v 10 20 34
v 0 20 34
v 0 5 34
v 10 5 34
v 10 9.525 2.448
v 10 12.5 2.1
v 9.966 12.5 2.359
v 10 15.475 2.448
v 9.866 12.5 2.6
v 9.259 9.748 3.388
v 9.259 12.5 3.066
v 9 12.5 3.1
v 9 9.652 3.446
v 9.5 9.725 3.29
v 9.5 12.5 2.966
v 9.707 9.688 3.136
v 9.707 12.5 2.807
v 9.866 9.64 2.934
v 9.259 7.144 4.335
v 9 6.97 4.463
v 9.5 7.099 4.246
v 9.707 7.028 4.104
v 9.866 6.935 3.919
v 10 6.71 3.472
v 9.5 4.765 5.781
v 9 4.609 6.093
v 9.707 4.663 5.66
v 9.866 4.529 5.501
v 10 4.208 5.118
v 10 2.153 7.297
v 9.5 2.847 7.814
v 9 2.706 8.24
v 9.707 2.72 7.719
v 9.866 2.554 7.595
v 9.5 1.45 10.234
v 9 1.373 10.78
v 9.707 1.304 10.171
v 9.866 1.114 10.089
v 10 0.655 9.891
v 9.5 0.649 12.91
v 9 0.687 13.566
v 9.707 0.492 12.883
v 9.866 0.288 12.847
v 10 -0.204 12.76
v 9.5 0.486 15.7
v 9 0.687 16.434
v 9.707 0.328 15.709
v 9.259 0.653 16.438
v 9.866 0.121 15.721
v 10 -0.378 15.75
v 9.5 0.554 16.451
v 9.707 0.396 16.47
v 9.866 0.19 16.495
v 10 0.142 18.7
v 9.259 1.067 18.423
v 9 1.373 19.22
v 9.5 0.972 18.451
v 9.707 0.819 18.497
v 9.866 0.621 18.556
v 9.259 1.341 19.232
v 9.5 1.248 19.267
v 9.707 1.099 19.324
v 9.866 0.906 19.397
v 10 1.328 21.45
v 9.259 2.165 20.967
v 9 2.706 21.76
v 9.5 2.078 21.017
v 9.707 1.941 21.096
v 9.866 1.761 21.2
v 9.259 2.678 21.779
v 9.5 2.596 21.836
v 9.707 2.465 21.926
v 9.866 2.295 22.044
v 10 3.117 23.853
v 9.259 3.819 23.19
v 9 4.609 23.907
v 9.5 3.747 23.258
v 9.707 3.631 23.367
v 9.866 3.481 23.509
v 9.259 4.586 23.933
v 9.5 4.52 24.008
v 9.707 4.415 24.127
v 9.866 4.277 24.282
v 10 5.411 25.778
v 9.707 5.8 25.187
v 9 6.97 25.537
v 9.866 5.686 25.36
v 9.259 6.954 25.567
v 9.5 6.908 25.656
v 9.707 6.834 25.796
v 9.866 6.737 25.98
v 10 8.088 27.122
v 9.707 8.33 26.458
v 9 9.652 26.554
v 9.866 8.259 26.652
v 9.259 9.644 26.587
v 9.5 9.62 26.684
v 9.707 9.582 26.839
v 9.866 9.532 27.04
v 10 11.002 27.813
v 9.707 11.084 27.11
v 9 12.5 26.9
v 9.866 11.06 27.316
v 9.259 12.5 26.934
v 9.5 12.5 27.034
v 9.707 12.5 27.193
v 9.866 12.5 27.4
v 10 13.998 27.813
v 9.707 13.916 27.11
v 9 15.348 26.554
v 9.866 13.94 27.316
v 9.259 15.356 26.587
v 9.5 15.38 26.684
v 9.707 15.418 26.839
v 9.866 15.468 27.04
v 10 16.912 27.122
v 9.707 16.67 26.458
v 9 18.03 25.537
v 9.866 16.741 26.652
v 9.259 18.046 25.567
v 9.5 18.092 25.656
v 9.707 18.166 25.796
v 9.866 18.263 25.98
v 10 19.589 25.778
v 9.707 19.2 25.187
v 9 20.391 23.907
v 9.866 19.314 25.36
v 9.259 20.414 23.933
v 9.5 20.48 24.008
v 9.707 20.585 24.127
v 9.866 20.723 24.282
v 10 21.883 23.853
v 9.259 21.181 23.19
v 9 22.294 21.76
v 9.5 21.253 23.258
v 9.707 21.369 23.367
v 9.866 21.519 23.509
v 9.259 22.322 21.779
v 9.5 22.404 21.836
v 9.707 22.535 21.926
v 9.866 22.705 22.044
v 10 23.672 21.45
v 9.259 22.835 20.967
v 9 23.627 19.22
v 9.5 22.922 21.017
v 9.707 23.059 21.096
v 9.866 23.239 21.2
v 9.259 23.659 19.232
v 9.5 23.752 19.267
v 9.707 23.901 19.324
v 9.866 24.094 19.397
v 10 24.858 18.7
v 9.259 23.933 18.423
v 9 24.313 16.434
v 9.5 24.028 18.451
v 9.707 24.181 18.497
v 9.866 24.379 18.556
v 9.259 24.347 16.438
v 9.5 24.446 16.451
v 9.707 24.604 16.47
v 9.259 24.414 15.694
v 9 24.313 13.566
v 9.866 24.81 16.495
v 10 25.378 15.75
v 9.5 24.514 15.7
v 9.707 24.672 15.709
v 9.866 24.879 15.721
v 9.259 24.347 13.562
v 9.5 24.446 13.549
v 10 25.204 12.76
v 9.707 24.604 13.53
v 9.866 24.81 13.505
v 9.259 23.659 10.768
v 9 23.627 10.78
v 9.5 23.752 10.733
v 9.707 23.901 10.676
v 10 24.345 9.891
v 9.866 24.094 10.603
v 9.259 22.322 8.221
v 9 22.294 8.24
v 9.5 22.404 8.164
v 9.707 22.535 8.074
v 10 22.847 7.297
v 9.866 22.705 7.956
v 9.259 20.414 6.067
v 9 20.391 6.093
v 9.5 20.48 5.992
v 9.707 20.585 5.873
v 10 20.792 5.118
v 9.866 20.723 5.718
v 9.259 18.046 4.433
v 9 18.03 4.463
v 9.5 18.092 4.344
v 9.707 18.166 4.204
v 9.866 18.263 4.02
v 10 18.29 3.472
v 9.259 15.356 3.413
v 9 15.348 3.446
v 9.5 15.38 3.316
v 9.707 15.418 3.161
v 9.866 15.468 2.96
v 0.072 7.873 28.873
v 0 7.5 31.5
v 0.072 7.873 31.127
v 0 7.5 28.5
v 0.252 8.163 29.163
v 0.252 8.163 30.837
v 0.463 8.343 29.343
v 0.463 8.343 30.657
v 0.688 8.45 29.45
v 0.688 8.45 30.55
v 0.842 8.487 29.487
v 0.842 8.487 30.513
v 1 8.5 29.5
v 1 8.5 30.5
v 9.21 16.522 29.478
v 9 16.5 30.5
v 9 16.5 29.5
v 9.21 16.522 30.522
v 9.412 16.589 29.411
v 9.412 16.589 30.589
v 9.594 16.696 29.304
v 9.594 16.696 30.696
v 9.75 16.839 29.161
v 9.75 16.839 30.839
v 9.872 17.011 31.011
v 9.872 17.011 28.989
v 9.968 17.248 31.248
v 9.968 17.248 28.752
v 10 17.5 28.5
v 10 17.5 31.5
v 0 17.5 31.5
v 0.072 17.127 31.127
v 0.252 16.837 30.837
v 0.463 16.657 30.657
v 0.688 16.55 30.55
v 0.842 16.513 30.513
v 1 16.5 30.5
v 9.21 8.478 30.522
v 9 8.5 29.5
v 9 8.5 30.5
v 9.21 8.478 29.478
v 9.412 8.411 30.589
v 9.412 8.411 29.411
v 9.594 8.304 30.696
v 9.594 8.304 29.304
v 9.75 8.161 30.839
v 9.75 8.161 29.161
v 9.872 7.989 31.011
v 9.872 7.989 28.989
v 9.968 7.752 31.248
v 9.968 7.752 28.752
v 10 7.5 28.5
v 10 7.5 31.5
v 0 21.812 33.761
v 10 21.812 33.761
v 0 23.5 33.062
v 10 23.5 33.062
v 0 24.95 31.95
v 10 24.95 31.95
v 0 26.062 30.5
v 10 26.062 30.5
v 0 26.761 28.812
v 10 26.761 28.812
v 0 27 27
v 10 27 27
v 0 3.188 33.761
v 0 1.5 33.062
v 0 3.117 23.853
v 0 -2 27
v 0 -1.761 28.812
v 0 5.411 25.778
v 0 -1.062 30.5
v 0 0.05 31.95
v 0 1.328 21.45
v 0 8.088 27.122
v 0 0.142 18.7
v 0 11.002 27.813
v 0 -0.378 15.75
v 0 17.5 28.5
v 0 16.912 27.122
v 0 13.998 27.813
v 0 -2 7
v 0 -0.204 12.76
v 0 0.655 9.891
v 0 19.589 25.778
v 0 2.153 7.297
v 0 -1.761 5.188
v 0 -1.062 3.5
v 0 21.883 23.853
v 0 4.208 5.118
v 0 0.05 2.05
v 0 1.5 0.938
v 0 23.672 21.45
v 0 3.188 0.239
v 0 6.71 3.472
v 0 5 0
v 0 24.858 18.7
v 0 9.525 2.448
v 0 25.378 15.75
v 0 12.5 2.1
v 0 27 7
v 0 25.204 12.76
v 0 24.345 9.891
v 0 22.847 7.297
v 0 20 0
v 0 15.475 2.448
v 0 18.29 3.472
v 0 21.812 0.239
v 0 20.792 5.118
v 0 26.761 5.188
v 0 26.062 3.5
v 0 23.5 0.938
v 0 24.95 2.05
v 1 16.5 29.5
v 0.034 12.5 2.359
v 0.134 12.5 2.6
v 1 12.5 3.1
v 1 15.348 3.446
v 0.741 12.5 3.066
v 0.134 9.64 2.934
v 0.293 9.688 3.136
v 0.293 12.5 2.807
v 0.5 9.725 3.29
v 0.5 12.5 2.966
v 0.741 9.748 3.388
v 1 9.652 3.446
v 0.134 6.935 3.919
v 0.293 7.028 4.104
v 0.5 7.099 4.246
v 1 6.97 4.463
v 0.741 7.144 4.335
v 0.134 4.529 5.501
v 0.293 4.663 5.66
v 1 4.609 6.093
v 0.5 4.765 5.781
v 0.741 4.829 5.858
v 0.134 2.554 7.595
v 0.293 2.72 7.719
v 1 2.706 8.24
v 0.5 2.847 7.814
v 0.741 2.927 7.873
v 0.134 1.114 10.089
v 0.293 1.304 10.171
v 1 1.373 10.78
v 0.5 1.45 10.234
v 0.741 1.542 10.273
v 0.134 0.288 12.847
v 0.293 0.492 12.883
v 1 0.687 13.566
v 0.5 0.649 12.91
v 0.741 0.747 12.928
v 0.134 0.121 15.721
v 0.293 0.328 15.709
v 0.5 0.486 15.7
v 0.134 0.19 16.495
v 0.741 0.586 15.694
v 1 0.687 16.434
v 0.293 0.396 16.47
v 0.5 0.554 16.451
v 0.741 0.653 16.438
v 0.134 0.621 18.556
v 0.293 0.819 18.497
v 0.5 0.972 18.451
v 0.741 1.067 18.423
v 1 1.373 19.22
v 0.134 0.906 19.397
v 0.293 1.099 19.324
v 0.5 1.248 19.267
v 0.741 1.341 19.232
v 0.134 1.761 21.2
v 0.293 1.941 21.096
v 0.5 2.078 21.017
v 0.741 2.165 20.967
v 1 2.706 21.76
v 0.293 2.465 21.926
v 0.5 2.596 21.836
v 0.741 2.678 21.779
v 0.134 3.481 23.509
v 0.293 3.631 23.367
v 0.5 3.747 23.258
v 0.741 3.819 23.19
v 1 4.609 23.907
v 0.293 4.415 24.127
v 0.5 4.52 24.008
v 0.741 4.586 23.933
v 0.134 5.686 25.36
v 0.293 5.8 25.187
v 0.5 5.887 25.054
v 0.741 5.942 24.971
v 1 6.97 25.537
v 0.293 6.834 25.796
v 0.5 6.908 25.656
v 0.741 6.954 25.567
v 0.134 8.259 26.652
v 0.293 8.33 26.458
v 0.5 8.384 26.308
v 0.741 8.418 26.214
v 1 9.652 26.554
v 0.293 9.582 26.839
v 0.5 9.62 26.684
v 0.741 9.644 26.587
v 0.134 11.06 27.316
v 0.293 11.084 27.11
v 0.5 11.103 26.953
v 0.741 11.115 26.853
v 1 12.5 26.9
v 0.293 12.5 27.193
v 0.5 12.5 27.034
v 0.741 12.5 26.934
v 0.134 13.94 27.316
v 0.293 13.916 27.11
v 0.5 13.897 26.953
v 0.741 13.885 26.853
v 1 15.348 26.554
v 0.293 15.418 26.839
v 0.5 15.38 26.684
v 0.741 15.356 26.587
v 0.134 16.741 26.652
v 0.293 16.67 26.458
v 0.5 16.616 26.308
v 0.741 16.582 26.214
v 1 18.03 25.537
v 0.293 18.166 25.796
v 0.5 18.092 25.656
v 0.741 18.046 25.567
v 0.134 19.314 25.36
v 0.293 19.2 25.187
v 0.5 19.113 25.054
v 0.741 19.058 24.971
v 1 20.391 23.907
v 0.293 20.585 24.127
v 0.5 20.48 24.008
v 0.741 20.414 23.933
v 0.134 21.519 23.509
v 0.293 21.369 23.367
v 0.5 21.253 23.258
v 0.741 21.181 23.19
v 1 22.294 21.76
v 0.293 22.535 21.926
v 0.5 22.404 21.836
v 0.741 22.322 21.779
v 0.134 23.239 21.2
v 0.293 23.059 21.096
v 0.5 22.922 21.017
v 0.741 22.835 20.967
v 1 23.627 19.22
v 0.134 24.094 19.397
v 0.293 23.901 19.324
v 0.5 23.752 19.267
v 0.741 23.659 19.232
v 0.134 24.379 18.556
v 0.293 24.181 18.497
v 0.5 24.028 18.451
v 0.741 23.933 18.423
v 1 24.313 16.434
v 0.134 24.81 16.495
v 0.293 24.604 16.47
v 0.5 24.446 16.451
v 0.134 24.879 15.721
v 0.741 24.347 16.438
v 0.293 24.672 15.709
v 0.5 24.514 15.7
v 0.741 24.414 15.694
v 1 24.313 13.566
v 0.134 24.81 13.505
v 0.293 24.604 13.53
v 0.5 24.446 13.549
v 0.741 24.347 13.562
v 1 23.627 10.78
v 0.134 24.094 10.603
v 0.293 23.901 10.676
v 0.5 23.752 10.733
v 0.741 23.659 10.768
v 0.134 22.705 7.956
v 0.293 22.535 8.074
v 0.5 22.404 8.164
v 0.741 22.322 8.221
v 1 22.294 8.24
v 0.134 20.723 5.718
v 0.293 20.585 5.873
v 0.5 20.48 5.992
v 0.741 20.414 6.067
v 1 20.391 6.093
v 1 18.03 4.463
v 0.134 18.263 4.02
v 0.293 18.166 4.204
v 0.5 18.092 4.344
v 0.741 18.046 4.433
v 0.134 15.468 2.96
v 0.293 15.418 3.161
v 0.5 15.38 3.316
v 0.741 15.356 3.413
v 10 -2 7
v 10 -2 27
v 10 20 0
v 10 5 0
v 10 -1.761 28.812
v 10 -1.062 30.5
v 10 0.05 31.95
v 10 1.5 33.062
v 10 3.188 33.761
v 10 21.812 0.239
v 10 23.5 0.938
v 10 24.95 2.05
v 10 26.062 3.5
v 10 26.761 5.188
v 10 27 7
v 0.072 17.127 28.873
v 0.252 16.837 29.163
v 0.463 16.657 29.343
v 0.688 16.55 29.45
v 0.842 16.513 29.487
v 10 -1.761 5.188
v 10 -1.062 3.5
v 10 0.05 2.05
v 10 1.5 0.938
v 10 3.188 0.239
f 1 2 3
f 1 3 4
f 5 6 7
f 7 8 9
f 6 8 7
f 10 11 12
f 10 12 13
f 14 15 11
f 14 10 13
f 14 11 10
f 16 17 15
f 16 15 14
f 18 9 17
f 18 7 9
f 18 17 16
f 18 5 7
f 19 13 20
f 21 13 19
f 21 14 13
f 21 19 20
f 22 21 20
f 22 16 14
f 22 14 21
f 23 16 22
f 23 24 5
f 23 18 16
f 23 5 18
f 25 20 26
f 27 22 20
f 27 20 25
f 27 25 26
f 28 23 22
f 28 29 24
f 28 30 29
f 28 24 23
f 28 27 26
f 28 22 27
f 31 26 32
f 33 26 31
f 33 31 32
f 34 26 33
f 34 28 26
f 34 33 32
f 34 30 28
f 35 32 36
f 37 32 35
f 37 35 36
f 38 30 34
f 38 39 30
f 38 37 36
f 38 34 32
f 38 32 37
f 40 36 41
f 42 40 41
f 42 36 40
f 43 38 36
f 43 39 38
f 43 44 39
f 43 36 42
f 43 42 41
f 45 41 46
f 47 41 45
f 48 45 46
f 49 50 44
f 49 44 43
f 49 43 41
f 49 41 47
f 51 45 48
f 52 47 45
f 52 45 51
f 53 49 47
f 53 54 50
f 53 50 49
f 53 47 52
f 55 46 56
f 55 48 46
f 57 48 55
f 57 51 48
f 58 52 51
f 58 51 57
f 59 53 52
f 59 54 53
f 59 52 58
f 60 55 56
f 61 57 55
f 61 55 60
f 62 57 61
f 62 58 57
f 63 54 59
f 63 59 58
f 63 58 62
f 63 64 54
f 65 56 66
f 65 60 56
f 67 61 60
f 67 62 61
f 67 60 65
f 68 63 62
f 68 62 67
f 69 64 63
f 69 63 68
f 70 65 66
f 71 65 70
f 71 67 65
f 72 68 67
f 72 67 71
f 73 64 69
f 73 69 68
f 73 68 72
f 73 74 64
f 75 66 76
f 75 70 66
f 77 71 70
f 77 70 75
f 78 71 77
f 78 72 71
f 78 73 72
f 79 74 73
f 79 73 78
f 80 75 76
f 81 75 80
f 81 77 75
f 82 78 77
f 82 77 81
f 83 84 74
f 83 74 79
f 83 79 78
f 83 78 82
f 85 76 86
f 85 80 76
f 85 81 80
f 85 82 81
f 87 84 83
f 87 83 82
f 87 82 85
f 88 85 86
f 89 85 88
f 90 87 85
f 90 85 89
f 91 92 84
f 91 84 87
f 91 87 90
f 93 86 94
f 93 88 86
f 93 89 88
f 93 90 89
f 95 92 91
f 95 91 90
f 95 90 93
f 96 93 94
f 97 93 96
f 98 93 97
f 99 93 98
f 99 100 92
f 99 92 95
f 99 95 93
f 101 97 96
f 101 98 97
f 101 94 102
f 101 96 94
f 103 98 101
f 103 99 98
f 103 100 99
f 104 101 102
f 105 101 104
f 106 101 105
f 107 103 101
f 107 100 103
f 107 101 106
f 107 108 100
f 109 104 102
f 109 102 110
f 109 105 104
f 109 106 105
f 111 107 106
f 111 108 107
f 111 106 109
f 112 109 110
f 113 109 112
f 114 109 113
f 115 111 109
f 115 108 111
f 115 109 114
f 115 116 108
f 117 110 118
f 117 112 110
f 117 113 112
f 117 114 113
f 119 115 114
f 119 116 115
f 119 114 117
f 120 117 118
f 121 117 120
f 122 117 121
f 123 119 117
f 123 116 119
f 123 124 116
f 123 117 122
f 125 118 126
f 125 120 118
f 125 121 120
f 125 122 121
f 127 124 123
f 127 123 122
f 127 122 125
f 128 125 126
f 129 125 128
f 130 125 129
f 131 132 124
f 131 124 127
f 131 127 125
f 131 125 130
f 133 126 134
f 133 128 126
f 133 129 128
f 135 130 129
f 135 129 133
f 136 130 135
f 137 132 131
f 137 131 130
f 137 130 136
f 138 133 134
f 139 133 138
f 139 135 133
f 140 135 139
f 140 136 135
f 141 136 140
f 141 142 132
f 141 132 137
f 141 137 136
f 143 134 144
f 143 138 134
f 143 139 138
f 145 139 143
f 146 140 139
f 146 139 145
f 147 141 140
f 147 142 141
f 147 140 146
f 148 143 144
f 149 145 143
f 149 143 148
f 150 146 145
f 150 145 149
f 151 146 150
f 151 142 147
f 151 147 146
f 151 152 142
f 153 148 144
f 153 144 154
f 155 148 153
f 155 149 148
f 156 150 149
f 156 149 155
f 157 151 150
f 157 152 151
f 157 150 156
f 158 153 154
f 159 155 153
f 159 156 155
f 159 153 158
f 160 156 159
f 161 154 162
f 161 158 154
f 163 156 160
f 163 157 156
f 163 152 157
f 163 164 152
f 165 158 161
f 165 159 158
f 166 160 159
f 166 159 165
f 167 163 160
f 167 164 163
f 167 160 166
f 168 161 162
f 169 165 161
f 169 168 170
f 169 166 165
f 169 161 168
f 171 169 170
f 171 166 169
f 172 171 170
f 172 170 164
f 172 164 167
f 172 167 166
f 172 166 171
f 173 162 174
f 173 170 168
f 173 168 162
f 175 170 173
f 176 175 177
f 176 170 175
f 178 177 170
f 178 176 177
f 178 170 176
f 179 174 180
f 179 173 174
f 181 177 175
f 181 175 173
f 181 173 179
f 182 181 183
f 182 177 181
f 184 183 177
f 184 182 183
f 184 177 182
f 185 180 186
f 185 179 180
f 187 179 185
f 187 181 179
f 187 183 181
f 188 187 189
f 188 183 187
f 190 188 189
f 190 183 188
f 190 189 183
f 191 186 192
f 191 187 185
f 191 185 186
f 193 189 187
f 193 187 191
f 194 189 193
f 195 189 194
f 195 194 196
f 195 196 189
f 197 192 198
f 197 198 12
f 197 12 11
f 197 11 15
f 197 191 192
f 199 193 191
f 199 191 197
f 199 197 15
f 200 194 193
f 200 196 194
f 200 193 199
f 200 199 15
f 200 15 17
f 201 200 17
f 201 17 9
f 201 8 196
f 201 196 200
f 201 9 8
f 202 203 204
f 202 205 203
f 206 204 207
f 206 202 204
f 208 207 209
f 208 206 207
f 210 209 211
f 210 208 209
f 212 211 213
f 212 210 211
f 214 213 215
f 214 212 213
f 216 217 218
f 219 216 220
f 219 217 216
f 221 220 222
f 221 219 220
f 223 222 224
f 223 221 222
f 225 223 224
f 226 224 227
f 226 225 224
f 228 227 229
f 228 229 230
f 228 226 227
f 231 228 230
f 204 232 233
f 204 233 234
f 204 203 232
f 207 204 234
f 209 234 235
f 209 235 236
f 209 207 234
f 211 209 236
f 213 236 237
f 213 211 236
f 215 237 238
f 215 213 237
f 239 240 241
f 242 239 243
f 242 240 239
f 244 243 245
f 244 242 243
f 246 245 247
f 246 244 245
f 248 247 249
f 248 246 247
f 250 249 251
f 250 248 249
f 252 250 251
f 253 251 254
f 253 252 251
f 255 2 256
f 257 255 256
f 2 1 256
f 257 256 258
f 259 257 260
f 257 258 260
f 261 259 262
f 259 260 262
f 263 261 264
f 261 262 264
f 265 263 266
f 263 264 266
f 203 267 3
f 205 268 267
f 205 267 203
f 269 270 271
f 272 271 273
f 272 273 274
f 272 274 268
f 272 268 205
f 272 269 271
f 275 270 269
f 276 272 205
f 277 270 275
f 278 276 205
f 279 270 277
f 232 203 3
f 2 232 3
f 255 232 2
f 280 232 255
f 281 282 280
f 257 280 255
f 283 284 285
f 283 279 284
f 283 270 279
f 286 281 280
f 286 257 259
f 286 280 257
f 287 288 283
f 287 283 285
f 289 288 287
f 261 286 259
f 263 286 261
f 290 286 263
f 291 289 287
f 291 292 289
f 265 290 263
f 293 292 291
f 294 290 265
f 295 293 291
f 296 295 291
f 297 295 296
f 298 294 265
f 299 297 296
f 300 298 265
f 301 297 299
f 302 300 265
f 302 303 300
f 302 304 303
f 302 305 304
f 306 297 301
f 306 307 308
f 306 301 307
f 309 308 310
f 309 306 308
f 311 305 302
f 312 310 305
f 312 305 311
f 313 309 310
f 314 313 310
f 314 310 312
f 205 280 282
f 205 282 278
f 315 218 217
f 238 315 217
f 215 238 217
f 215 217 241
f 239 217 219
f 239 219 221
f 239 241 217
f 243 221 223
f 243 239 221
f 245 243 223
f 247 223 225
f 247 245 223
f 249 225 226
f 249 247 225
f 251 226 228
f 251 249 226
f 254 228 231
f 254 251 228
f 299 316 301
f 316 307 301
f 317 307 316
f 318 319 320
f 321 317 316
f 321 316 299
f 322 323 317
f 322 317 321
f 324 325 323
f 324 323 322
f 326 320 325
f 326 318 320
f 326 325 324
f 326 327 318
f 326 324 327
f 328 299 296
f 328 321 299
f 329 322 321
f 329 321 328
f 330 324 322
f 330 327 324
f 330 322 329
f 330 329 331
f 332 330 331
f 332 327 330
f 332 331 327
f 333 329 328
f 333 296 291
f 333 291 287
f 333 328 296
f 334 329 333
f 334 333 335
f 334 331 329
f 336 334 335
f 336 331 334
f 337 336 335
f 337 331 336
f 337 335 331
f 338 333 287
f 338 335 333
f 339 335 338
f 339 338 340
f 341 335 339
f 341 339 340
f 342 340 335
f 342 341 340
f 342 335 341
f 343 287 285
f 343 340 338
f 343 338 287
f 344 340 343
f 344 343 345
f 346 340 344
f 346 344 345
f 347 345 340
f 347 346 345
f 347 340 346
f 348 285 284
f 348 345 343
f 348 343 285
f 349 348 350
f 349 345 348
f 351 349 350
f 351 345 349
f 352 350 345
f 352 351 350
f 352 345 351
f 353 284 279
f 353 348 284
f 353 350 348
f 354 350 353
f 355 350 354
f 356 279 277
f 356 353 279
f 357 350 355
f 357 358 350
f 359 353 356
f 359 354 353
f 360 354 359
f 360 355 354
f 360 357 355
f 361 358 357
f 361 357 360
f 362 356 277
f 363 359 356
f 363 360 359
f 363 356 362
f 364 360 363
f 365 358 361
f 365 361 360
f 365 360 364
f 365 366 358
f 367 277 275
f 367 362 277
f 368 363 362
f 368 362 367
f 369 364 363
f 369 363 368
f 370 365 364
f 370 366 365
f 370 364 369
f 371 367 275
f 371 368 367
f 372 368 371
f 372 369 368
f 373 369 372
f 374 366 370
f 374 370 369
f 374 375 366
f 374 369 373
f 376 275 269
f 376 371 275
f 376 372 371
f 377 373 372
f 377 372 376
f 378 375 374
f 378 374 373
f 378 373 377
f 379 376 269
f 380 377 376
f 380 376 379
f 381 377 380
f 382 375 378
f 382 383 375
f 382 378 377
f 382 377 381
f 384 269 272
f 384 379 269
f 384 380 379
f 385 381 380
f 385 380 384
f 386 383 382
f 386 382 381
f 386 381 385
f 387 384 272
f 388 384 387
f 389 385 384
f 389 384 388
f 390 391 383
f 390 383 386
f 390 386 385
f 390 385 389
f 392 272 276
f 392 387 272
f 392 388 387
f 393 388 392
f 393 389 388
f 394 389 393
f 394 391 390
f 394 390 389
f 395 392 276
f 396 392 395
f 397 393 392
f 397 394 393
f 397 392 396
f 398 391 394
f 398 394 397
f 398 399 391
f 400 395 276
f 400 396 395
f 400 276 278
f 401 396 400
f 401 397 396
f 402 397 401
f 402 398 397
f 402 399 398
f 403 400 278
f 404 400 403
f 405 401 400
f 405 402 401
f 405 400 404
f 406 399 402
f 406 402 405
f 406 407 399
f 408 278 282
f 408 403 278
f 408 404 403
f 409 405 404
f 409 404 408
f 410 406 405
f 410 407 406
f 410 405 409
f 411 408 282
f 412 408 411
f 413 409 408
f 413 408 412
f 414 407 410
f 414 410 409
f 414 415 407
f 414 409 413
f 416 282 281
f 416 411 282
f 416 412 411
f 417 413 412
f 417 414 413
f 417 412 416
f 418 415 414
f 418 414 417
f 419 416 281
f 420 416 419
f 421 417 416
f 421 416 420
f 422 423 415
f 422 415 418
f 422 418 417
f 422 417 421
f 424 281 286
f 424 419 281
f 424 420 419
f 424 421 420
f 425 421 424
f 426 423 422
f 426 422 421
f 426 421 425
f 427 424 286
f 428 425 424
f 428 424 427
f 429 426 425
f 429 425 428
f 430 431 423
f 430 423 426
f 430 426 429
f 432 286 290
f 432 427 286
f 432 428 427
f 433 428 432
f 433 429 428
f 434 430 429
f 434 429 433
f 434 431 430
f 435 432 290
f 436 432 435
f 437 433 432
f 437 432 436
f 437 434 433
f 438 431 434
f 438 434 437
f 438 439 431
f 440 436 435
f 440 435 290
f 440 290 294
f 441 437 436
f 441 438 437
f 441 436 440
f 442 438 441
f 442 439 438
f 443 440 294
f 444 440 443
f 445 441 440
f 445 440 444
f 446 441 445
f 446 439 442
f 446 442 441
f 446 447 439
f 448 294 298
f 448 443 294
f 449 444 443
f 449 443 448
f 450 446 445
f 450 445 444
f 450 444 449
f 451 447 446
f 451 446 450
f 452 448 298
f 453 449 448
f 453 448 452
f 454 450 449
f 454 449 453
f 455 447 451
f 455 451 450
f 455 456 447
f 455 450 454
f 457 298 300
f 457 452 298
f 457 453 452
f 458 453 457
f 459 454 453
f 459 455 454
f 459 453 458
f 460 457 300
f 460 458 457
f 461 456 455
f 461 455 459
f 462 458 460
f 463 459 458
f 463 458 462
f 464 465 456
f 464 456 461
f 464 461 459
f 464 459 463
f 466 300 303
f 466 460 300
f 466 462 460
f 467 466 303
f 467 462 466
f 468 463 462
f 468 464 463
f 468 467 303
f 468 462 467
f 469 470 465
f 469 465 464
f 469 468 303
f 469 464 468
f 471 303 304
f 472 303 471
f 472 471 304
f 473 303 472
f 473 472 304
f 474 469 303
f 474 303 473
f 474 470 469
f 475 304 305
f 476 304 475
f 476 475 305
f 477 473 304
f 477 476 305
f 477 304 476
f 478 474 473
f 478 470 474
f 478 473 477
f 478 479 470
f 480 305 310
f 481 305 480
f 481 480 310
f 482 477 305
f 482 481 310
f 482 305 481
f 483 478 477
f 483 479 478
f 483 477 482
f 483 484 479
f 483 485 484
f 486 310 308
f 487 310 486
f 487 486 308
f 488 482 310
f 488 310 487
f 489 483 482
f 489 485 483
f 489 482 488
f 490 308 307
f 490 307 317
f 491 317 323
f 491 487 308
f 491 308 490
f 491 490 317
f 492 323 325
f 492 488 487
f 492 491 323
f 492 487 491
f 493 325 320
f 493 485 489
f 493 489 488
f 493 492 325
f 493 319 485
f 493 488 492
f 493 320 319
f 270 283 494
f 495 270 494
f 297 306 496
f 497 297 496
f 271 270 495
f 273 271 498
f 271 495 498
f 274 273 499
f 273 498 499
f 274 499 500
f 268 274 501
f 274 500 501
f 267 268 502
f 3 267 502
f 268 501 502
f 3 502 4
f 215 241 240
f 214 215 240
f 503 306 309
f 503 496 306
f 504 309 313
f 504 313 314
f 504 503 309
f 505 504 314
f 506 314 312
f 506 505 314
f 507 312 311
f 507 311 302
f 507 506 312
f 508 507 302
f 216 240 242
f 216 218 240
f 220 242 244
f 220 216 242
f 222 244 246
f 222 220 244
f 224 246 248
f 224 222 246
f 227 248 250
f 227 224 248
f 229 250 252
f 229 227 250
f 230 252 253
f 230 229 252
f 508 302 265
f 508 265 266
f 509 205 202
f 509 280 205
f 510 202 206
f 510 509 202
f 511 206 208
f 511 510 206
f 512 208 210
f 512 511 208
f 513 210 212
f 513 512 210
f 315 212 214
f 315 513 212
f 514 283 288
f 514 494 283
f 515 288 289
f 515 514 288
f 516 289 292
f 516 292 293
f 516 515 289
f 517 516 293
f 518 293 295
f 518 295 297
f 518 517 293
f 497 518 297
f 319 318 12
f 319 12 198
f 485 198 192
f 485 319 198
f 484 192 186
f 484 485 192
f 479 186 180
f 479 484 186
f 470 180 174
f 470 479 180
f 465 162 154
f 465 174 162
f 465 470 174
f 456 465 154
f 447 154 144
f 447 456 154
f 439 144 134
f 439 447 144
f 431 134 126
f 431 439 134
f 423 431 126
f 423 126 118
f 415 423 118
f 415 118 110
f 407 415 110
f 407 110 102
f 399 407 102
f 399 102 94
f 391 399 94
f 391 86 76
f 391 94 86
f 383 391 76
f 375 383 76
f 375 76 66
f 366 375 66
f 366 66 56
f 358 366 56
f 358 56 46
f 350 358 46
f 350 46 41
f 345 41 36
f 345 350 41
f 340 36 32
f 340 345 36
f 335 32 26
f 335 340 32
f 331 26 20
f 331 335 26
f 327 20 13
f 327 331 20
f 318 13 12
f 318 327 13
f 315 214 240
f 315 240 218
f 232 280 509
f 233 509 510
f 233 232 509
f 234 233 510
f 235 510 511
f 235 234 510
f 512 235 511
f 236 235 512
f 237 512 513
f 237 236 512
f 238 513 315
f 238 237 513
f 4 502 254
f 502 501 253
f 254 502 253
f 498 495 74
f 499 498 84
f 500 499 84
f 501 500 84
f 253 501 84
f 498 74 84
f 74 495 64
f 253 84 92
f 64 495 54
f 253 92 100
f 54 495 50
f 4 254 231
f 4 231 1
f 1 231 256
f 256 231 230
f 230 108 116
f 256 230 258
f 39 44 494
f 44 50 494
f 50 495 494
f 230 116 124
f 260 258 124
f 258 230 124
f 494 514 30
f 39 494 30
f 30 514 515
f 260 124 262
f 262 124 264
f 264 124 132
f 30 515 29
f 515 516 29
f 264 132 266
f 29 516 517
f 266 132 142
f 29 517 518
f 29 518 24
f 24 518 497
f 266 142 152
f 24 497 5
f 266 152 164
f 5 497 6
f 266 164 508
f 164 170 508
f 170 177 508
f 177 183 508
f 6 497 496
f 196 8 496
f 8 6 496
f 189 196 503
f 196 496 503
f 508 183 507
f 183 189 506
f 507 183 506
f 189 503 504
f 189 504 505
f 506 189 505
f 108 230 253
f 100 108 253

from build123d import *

# Parameters (mm, degrees)
SKETCH1_W               = 10
SKETCH1_H               = 29
BOSS_EXTRUDE1_DEPTH     = 34
CUT_EXTRUDE1_DEPTH      = 45.55333882
CUT_EXTRUDE1_DEPTH_BACK = 45.55333882
SKETCH2_R               = 11.9
FILLET1_R               = 1
FILLET2_R               = 7
CUT_EXTRUDE2_DEPTH      = 45.55333882
CUT_EXTRUDE2_DEPTH_BACK = 45.55333882
FILLET3_R               = 1
FILLET4_R               = 1
FILLET5_R               = 7


with BuildPart() as part:
    # Sketch1 → Boss-Extrude1 (new body)
    with BuildSketch(Plane.XY):
        with Locations((5, 12.5)):
            Rectangle(SKETCH1_W, SKETCH1_H)
    extrude(amount=BOSS_EXTRUDE1_DEPTH)

    # Sketch2 → Cut-Extrude1 (cut, two sides: drawn at the far end of the back side and taken through both)
    with BuildSketch(Plane(origin=(10, 0, 0), x_dir=(0, 0, -1), z_dir=(1, 0, 0)).offset(-CUT_EXTRUDE1_DEPTH_BACK)):
        with Locations((-15, 12.5)):
            Circle(SKETCH2_R)
    extrude(amount=CUT_EXTRUDE1_DEPTH + CUT_EXTRUDE1_DEPTH_BACK, mode=Mode.SUBTRACT)

    # Fillet1
    fillet1_edges = [part.edges().sort_by_distance(p)[0] for p in [
        (0, 12.5, 26.9),
        (10, 12.5, 26.9),
    ]]
    fillet(fillet1_edges, radius=FILLET1_R)

    # Fillet2
    fillet2_edges = [part.edges().sort_by_distance(p)[0] for p in [
        (5, 27, 0),
        (5, -2, 0),
    ]]
    fillet(fillet2_edges, radius=FILLET2_R)

    # Sketch3 → Cut-Extrude2 (cut, two sides: drawn at the far end of the back side and taken through both)
    with BuildSketch(Plane(origin=(10, 0, 0), x_dir=(0, 0, -1), z_dir=(1, 0, 0)).offset(-CUT_EXTRUDE2_DEPTH_BACK)):
        Polygon((-29.5, 12.5), (-29.5, 16.5), (-30.5, 16.5), (-30.5, 8.5), (-29.5, 8.5), align=None)
    extrude(amount=CUT_EXTRUDE2_DEPTH + CUT_EXTRUDE2_DEPTH_BACK, mode=Mode.SUBTRACT)

    # Fillet3
    fillet3_edges = [part.edges().sort_by_distance(p)[0] for p in [
        (0, 8.5, 30),
        (0, 12.5, 30.5),
        (0, 16.5, 30),
        (0, 12.5, 29.5),
    ]]
    fillet(fillet3_edges, radius=FILLET3_R)

    # Fillet4
    fillet4_edges = [part.edges().sort_by_distance(p)[0] for p in [
        (10, 12.5, 29.5),
        (10, 16.5, 30),
        (10, 12.5, 30.5),
        (10, 8.5, 30),
    ]]
    fillet(fillet4_edges, radius=FILLET4_R)

    # Fillet5
    fillet5_edges = [part.edges().sort_by_distance(p)[0] for p in [
        (5, 27, 34),
        (5, -2, 34),
    ]]
    fillet(fillet5_edges, radius=FILLET5_R)


solid = part.part
